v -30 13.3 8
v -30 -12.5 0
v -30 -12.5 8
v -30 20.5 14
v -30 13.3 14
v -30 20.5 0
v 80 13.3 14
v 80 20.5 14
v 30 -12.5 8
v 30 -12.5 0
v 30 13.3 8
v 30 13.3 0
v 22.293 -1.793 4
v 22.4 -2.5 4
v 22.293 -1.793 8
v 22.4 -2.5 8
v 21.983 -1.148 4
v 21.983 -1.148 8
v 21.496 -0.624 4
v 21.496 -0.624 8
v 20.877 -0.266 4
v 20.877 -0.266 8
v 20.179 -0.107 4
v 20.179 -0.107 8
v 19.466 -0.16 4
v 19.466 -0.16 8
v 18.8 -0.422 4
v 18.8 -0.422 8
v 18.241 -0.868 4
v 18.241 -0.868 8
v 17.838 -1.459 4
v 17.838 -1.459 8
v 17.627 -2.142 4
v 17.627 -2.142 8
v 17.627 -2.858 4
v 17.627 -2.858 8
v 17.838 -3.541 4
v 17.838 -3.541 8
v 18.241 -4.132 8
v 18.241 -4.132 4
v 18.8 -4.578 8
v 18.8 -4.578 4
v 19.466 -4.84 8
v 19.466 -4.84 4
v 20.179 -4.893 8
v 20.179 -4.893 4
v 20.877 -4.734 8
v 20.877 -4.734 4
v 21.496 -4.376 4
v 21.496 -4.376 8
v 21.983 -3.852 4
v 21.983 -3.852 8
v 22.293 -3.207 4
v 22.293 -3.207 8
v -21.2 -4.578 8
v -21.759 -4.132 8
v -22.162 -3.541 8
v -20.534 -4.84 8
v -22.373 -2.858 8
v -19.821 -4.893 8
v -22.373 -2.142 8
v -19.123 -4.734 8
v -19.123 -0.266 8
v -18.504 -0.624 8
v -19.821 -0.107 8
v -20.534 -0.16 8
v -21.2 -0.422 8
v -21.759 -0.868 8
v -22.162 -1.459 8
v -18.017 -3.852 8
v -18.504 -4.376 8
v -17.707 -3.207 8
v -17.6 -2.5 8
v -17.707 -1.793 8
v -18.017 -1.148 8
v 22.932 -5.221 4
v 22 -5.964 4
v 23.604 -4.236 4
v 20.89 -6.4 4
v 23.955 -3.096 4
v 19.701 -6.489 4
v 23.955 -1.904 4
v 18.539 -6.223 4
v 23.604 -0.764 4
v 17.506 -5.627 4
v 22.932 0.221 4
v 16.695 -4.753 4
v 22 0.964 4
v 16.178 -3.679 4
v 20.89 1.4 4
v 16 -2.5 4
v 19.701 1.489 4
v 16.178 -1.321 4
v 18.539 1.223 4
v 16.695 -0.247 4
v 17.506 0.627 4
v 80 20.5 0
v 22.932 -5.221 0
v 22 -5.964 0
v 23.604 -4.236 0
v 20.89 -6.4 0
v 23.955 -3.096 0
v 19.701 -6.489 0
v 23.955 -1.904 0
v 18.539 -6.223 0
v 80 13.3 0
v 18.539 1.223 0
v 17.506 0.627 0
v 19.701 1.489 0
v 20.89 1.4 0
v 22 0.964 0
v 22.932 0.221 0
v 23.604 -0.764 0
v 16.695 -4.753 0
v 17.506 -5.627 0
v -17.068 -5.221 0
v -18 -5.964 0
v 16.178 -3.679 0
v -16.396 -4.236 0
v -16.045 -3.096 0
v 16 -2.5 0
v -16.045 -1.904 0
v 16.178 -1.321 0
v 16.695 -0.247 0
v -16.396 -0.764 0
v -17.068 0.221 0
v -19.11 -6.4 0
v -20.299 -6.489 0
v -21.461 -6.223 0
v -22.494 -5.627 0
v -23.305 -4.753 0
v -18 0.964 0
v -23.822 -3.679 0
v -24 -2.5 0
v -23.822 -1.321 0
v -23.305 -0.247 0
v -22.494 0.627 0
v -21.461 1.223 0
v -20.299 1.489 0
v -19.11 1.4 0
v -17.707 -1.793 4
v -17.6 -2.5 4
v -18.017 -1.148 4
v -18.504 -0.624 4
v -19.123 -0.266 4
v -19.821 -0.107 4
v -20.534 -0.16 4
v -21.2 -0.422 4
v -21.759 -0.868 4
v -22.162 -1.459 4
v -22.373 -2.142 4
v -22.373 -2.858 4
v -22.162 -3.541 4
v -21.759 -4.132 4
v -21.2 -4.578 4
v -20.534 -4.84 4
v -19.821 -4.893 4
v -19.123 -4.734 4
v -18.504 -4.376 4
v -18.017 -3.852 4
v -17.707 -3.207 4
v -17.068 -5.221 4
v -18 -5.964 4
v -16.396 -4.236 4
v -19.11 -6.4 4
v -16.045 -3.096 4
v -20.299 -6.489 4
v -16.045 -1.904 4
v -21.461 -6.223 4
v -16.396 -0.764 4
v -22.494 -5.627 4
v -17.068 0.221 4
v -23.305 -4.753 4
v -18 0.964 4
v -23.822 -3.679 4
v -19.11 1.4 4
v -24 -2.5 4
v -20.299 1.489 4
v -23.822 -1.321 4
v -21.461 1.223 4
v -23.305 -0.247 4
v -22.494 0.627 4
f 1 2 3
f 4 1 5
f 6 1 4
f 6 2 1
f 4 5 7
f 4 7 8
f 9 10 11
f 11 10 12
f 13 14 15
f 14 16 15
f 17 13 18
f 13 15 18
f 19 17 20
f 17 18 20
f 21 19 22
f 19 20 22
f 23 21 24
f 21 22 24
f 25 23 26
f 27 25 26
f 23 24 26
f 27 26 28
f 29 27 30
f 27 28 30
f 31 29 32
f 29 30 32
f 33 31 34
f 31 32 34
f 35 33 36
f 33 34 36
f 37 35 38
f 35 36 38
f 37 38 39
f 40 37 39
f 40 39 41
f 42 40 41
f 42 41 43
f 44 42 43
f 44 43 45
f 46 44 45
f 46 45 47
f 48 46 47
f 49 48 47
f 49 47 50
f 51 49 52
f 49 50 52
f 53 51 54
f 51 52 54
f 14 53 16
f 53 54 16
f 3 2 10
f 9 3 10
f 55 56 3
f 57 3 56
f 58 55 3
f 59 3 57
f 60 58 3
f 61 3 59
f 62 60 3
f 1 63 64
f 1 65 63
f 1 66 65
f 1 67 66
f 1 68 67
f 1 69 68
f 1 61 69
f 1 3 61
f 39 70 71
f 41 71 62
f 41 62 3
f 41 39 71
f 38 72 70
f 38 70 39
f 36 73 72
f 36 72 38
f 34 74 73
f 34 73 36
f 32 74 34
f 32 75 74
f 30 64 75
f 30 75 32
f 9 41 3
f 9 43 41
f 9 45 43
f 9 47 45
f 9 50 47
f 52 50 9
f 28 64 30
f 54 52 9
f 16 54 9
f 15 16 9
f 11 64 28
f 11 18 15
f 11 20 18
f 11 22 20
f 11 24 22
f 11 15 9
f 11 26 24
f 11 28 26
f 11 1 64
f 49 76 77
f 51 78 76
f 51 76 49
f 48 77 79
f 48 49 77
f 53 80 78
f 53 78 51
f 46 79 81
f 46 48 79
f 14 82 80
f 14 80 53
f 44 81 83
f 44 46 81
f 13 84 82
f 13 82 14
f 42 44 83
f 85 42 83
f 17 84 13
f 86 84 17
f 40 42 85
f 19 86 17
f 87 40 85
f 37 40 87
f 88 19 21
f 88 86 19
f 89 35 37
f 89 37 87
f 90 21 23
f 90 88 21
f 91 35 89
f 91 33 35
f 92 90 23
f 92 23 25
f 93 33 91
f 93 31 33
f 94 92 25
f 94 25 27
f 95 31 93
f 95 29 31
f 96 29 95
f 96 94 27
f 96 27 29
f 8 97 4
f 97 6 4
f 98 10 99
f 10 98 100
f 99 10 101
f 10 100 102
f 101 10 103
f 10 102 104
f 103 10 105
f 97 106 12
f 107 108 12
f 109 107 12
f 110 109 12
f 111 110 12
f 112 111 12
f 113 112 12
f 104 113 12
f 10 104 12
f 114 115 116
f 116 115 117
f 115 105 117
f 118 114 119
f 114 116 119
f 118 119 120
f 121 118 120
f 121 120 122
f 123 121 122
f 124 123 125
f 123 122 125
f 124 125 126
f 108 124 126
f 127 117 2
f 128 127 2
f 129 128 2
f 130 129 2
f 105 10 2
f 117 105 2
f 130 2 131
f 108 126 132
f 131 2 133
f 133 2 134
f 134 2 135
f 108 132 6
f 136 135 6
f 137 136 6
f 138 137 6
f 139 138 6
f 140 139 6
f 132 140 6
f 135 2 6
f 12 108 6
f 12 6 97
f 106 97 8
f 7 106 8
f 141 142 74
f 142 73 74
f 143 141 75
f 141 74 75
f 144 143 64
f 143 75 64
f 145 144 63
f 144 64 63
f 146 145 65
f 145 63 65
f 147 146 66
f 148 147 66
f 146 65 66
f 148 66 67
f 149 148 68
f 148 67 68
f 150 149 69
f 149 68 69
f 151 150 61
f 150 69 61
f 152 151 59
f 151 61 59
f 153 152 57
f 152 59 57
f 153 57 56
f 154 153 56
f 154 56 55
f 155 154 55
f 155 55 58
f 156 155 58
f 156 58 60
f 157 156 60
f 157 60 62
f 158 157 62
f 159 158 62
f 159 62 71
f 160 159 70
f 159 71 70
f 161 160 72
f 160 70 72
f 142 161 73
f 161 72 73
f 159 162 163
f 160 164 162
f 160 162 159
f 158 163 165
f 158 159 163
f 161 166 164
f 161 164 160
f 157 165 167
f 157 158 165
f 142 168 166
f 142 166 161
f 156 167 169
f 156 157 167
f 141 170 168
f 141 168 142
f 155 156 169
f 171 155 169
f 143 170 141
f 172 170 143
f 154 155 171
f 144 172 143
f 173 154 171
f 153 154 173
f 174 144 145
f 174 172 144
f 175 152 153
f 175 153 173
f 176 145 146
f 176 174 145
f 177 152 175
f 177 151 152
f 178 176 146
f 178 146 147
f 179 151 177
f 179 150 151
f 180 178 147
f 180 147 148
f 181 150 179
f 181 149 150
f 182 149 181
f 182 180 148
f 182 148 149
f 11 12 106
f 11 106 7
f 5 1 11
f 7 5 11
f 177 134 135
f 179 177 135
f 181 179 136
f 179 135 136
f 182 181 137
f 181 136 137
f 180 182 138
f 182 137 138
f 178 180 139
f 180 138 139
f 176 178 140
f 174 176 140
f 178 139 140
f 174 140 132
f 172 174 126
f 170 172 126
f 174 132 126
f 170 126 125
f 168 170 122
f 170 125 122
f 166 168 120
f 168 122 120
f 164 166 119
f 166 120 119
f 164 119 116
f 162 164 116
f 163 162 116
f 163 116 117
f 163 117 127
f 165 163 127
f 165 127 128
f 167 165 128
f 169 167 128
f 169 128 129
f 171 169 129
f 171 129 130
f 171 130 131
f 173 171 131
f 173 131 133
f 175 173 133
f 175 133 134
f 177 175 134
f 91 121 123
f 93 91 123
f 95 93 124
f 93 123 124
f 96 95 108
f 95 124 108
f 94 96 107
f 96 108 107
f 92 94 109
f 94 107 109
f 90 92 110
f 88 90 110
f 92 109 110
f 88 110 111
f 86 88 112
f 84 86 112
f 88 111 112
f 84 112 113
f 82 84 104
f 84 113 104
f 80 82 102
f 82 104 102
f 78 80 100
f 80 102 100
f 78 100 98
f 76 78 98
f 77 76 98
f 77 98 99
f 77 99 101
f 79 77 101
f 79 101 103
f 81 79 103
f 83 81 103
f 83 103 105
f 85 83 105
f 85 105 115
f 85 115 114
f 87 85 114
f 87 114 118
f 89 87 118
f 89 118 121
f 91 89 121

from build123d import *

# Parameters (mm, degrees)
SKETCH_1_W                   = 60
SKETCH_1_H                   = 25
EXTRUDE_1_DEPTH              = 8
EXTRUDE_2_DEPTH              = 6
EXTRUDE_2_DEPTH_BACK         = 8
SKETCH_2_W                   = 60
SKETCH_2_H                   = 8
CUT_EXTRUDE_1_DEPTH          = 65.932657423
CUT_EXTRUDE_1_DEPTH_BACK     = 65.932657423
SKETCH_3_W                   = 6
SKETCH_3_H                   = 0.8
HOLE_WIZARD_M4_1_D           = 4.8
HOLE_WIZARD_M4_1_DEPTH       = 10.1
HOLE_WIZARD_M4_1_CBORE_D     = 8
HOLE_WIZARD_M4_1_CBORE_DEPTH = 4
HOLE_WIZARD_M4_1_TIP         = 1.442065486
SKETCH_7_W                   = 14
SKETCH_7_H                   = 7.2
EXTRUDE_3_DEPTH              = 50


with BuildPart() as part:
    # 스케치1 → 보스-돌출1 (new body)
    with BuildSketch(Plane.XY):
        Rectangle(SKETCH_1_W, SKETCH_1_H)
    extrude(amount=EXTRUDE_1_DEPTH)

    # 스케치2 → 보스-돌출2 (add, two sides: drawn at the far end of the back side and taken through both)
    with BuildSketch(Plane.XY.offset(8).offset(-EXTRUDE_2_DEPTH_BACK)):
        with Locations((0, 16.5)):
            Rectangle(SKETCH_2_W, SKETCH_2_H)
    extrude(amount=EXTRUDE_2_DEPTH + EXTRUDE_2_DEPTH_BACK)

    # 스케치3 → 컷-돌출1 (cut, two sides: drawn at the far end of the back side and taken through both)
    with BuildSketch(Plane(origin=(30, 0, 0), x_dir=(0, 0, -1), z_dir=(1, 0, 0)).offset(-CUT_EXTRUDE_1_DEPTH_BACK)):
        with Locations((-11, 12.9)):
            Rectangle(SKETCH_3_W, SKETCH_3_H)
    extrude(amount=CUT_EXTRUDE_1_DEPTH + CUT_EXTRUDE_1_DEPTH_BACK, mode=Mode.SUBTRACT)

    # M4 소켓 머리 캡 나사용 카운터보어1
    with Locations(Plane(origin=(0, 0, 0), x_dir=(-1, 0, 0), z_dir=(0, 0, -1))):
        with Locations((-20, -2.5), (20, -2.5)):
            CounterBoreHole(HOLE_WIZARD_M4_1_D / 2, HOLE_WIZARD_M4_1_CBORE_D / 2, HOLE_WIZARD_M4_1_CBORE_DEPTH, depth=HOLE_WIZARD_M4_1_DEPTH)
            with Locations((0, 0, -(HOLE_WIZARD_M4_1_DEPTH + HOLE_WIZARD_M4_1_TIP / 2))):  # 118° drill point
                Cone(0, HOLE_WIZARD_M4_1_D / 2, HOLE_WIZARD_M4_1_TIP, mode=Mode.SUBTRACT)

    # 스케치7 → 보스-돌출3 (add)
    with BuildSketch(Plane.ZY.offset(-30)):
        with Locations((7, 16.9)):
            Rectangle(SKETCH_7_W, SKETCH_7_H)
    extrude(amount=-EXTRUDE_3_DEPTH)


solid = part.part
